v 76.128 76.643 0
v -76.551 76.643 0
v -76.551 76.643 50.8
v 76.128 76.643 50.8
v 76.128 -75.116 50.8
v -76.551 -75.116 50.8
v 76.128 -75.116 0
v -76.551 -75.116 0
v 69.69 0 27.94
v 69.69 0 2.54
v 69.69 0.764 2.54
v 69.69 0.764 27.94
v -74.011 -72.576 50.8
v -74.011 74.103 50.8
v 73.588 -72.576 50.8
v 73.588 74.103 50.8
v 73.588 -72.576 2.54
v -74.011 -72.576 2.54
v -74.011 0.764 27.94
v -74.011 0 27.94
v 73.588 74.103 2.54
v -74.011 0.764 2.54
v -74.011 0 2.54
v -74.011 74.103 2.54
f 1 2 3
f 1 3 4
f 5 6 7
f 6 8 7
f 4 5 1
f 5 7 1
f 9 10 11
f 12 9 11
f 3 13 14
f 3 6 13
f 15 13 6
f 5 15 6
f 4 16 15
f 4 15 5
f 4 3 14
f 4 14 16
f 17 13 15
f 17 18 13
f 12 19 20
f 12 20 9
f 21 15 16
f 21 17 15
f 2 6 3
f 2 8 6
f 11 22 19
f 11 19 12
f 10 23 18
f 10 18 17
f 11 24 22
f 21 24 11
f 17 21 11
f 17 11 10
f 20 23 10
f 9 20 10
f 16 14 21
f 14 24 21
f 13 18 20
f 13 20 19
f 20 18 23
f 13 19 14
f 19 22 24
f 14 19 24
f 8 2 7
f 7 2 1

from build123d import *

# Parameters (mm, degrees)
F0_W     = 152.678899467
F0_H     = 151.7591327429
F1_DEPTH = 25.4
F2_DEPTH = 25.4
F3_T     = -2.54
F4_W     = 143.7006218052
F4_H     = 0.7638186216
F5_DEPTH = 25.4


with BuildPart() as f1:
    # F0 (on Top) → F1 (new body)
    with BuildSketch(Plane.XY):
        with Locations((-0.2116523683, 0.7638186216)):
            Rectangle(F0_W, F0_H)
    extrude(amount=F1_DEPTH)

    # F2 (add): a face of the model
    f2_faces = [f1.faces().sort_by_distance(p)[0] for p in [
        (-0.2116523683, 0.7638186216, 25.4),
    ]]
    extrude(f2_faces, amount=F2_DEPTH)

    # F3
    f3_openings = [f1.faces().sort_by_distance(p)[0] for p in [
        (-0.211652, 0.763819, 50.8),
    ]]
    offset(amount=F3_T, openings=f3_openings)

    # F4 (on face) → F5 (join)
    with BuildSketch(Plane.XY.offset(2.54)):
        with Locations((-2.1607911992, 0.3819093108)):
            Rectangle(F4_W, F4_H)
    extrude(amount=F5_DEPTH)


solid = f1.part
